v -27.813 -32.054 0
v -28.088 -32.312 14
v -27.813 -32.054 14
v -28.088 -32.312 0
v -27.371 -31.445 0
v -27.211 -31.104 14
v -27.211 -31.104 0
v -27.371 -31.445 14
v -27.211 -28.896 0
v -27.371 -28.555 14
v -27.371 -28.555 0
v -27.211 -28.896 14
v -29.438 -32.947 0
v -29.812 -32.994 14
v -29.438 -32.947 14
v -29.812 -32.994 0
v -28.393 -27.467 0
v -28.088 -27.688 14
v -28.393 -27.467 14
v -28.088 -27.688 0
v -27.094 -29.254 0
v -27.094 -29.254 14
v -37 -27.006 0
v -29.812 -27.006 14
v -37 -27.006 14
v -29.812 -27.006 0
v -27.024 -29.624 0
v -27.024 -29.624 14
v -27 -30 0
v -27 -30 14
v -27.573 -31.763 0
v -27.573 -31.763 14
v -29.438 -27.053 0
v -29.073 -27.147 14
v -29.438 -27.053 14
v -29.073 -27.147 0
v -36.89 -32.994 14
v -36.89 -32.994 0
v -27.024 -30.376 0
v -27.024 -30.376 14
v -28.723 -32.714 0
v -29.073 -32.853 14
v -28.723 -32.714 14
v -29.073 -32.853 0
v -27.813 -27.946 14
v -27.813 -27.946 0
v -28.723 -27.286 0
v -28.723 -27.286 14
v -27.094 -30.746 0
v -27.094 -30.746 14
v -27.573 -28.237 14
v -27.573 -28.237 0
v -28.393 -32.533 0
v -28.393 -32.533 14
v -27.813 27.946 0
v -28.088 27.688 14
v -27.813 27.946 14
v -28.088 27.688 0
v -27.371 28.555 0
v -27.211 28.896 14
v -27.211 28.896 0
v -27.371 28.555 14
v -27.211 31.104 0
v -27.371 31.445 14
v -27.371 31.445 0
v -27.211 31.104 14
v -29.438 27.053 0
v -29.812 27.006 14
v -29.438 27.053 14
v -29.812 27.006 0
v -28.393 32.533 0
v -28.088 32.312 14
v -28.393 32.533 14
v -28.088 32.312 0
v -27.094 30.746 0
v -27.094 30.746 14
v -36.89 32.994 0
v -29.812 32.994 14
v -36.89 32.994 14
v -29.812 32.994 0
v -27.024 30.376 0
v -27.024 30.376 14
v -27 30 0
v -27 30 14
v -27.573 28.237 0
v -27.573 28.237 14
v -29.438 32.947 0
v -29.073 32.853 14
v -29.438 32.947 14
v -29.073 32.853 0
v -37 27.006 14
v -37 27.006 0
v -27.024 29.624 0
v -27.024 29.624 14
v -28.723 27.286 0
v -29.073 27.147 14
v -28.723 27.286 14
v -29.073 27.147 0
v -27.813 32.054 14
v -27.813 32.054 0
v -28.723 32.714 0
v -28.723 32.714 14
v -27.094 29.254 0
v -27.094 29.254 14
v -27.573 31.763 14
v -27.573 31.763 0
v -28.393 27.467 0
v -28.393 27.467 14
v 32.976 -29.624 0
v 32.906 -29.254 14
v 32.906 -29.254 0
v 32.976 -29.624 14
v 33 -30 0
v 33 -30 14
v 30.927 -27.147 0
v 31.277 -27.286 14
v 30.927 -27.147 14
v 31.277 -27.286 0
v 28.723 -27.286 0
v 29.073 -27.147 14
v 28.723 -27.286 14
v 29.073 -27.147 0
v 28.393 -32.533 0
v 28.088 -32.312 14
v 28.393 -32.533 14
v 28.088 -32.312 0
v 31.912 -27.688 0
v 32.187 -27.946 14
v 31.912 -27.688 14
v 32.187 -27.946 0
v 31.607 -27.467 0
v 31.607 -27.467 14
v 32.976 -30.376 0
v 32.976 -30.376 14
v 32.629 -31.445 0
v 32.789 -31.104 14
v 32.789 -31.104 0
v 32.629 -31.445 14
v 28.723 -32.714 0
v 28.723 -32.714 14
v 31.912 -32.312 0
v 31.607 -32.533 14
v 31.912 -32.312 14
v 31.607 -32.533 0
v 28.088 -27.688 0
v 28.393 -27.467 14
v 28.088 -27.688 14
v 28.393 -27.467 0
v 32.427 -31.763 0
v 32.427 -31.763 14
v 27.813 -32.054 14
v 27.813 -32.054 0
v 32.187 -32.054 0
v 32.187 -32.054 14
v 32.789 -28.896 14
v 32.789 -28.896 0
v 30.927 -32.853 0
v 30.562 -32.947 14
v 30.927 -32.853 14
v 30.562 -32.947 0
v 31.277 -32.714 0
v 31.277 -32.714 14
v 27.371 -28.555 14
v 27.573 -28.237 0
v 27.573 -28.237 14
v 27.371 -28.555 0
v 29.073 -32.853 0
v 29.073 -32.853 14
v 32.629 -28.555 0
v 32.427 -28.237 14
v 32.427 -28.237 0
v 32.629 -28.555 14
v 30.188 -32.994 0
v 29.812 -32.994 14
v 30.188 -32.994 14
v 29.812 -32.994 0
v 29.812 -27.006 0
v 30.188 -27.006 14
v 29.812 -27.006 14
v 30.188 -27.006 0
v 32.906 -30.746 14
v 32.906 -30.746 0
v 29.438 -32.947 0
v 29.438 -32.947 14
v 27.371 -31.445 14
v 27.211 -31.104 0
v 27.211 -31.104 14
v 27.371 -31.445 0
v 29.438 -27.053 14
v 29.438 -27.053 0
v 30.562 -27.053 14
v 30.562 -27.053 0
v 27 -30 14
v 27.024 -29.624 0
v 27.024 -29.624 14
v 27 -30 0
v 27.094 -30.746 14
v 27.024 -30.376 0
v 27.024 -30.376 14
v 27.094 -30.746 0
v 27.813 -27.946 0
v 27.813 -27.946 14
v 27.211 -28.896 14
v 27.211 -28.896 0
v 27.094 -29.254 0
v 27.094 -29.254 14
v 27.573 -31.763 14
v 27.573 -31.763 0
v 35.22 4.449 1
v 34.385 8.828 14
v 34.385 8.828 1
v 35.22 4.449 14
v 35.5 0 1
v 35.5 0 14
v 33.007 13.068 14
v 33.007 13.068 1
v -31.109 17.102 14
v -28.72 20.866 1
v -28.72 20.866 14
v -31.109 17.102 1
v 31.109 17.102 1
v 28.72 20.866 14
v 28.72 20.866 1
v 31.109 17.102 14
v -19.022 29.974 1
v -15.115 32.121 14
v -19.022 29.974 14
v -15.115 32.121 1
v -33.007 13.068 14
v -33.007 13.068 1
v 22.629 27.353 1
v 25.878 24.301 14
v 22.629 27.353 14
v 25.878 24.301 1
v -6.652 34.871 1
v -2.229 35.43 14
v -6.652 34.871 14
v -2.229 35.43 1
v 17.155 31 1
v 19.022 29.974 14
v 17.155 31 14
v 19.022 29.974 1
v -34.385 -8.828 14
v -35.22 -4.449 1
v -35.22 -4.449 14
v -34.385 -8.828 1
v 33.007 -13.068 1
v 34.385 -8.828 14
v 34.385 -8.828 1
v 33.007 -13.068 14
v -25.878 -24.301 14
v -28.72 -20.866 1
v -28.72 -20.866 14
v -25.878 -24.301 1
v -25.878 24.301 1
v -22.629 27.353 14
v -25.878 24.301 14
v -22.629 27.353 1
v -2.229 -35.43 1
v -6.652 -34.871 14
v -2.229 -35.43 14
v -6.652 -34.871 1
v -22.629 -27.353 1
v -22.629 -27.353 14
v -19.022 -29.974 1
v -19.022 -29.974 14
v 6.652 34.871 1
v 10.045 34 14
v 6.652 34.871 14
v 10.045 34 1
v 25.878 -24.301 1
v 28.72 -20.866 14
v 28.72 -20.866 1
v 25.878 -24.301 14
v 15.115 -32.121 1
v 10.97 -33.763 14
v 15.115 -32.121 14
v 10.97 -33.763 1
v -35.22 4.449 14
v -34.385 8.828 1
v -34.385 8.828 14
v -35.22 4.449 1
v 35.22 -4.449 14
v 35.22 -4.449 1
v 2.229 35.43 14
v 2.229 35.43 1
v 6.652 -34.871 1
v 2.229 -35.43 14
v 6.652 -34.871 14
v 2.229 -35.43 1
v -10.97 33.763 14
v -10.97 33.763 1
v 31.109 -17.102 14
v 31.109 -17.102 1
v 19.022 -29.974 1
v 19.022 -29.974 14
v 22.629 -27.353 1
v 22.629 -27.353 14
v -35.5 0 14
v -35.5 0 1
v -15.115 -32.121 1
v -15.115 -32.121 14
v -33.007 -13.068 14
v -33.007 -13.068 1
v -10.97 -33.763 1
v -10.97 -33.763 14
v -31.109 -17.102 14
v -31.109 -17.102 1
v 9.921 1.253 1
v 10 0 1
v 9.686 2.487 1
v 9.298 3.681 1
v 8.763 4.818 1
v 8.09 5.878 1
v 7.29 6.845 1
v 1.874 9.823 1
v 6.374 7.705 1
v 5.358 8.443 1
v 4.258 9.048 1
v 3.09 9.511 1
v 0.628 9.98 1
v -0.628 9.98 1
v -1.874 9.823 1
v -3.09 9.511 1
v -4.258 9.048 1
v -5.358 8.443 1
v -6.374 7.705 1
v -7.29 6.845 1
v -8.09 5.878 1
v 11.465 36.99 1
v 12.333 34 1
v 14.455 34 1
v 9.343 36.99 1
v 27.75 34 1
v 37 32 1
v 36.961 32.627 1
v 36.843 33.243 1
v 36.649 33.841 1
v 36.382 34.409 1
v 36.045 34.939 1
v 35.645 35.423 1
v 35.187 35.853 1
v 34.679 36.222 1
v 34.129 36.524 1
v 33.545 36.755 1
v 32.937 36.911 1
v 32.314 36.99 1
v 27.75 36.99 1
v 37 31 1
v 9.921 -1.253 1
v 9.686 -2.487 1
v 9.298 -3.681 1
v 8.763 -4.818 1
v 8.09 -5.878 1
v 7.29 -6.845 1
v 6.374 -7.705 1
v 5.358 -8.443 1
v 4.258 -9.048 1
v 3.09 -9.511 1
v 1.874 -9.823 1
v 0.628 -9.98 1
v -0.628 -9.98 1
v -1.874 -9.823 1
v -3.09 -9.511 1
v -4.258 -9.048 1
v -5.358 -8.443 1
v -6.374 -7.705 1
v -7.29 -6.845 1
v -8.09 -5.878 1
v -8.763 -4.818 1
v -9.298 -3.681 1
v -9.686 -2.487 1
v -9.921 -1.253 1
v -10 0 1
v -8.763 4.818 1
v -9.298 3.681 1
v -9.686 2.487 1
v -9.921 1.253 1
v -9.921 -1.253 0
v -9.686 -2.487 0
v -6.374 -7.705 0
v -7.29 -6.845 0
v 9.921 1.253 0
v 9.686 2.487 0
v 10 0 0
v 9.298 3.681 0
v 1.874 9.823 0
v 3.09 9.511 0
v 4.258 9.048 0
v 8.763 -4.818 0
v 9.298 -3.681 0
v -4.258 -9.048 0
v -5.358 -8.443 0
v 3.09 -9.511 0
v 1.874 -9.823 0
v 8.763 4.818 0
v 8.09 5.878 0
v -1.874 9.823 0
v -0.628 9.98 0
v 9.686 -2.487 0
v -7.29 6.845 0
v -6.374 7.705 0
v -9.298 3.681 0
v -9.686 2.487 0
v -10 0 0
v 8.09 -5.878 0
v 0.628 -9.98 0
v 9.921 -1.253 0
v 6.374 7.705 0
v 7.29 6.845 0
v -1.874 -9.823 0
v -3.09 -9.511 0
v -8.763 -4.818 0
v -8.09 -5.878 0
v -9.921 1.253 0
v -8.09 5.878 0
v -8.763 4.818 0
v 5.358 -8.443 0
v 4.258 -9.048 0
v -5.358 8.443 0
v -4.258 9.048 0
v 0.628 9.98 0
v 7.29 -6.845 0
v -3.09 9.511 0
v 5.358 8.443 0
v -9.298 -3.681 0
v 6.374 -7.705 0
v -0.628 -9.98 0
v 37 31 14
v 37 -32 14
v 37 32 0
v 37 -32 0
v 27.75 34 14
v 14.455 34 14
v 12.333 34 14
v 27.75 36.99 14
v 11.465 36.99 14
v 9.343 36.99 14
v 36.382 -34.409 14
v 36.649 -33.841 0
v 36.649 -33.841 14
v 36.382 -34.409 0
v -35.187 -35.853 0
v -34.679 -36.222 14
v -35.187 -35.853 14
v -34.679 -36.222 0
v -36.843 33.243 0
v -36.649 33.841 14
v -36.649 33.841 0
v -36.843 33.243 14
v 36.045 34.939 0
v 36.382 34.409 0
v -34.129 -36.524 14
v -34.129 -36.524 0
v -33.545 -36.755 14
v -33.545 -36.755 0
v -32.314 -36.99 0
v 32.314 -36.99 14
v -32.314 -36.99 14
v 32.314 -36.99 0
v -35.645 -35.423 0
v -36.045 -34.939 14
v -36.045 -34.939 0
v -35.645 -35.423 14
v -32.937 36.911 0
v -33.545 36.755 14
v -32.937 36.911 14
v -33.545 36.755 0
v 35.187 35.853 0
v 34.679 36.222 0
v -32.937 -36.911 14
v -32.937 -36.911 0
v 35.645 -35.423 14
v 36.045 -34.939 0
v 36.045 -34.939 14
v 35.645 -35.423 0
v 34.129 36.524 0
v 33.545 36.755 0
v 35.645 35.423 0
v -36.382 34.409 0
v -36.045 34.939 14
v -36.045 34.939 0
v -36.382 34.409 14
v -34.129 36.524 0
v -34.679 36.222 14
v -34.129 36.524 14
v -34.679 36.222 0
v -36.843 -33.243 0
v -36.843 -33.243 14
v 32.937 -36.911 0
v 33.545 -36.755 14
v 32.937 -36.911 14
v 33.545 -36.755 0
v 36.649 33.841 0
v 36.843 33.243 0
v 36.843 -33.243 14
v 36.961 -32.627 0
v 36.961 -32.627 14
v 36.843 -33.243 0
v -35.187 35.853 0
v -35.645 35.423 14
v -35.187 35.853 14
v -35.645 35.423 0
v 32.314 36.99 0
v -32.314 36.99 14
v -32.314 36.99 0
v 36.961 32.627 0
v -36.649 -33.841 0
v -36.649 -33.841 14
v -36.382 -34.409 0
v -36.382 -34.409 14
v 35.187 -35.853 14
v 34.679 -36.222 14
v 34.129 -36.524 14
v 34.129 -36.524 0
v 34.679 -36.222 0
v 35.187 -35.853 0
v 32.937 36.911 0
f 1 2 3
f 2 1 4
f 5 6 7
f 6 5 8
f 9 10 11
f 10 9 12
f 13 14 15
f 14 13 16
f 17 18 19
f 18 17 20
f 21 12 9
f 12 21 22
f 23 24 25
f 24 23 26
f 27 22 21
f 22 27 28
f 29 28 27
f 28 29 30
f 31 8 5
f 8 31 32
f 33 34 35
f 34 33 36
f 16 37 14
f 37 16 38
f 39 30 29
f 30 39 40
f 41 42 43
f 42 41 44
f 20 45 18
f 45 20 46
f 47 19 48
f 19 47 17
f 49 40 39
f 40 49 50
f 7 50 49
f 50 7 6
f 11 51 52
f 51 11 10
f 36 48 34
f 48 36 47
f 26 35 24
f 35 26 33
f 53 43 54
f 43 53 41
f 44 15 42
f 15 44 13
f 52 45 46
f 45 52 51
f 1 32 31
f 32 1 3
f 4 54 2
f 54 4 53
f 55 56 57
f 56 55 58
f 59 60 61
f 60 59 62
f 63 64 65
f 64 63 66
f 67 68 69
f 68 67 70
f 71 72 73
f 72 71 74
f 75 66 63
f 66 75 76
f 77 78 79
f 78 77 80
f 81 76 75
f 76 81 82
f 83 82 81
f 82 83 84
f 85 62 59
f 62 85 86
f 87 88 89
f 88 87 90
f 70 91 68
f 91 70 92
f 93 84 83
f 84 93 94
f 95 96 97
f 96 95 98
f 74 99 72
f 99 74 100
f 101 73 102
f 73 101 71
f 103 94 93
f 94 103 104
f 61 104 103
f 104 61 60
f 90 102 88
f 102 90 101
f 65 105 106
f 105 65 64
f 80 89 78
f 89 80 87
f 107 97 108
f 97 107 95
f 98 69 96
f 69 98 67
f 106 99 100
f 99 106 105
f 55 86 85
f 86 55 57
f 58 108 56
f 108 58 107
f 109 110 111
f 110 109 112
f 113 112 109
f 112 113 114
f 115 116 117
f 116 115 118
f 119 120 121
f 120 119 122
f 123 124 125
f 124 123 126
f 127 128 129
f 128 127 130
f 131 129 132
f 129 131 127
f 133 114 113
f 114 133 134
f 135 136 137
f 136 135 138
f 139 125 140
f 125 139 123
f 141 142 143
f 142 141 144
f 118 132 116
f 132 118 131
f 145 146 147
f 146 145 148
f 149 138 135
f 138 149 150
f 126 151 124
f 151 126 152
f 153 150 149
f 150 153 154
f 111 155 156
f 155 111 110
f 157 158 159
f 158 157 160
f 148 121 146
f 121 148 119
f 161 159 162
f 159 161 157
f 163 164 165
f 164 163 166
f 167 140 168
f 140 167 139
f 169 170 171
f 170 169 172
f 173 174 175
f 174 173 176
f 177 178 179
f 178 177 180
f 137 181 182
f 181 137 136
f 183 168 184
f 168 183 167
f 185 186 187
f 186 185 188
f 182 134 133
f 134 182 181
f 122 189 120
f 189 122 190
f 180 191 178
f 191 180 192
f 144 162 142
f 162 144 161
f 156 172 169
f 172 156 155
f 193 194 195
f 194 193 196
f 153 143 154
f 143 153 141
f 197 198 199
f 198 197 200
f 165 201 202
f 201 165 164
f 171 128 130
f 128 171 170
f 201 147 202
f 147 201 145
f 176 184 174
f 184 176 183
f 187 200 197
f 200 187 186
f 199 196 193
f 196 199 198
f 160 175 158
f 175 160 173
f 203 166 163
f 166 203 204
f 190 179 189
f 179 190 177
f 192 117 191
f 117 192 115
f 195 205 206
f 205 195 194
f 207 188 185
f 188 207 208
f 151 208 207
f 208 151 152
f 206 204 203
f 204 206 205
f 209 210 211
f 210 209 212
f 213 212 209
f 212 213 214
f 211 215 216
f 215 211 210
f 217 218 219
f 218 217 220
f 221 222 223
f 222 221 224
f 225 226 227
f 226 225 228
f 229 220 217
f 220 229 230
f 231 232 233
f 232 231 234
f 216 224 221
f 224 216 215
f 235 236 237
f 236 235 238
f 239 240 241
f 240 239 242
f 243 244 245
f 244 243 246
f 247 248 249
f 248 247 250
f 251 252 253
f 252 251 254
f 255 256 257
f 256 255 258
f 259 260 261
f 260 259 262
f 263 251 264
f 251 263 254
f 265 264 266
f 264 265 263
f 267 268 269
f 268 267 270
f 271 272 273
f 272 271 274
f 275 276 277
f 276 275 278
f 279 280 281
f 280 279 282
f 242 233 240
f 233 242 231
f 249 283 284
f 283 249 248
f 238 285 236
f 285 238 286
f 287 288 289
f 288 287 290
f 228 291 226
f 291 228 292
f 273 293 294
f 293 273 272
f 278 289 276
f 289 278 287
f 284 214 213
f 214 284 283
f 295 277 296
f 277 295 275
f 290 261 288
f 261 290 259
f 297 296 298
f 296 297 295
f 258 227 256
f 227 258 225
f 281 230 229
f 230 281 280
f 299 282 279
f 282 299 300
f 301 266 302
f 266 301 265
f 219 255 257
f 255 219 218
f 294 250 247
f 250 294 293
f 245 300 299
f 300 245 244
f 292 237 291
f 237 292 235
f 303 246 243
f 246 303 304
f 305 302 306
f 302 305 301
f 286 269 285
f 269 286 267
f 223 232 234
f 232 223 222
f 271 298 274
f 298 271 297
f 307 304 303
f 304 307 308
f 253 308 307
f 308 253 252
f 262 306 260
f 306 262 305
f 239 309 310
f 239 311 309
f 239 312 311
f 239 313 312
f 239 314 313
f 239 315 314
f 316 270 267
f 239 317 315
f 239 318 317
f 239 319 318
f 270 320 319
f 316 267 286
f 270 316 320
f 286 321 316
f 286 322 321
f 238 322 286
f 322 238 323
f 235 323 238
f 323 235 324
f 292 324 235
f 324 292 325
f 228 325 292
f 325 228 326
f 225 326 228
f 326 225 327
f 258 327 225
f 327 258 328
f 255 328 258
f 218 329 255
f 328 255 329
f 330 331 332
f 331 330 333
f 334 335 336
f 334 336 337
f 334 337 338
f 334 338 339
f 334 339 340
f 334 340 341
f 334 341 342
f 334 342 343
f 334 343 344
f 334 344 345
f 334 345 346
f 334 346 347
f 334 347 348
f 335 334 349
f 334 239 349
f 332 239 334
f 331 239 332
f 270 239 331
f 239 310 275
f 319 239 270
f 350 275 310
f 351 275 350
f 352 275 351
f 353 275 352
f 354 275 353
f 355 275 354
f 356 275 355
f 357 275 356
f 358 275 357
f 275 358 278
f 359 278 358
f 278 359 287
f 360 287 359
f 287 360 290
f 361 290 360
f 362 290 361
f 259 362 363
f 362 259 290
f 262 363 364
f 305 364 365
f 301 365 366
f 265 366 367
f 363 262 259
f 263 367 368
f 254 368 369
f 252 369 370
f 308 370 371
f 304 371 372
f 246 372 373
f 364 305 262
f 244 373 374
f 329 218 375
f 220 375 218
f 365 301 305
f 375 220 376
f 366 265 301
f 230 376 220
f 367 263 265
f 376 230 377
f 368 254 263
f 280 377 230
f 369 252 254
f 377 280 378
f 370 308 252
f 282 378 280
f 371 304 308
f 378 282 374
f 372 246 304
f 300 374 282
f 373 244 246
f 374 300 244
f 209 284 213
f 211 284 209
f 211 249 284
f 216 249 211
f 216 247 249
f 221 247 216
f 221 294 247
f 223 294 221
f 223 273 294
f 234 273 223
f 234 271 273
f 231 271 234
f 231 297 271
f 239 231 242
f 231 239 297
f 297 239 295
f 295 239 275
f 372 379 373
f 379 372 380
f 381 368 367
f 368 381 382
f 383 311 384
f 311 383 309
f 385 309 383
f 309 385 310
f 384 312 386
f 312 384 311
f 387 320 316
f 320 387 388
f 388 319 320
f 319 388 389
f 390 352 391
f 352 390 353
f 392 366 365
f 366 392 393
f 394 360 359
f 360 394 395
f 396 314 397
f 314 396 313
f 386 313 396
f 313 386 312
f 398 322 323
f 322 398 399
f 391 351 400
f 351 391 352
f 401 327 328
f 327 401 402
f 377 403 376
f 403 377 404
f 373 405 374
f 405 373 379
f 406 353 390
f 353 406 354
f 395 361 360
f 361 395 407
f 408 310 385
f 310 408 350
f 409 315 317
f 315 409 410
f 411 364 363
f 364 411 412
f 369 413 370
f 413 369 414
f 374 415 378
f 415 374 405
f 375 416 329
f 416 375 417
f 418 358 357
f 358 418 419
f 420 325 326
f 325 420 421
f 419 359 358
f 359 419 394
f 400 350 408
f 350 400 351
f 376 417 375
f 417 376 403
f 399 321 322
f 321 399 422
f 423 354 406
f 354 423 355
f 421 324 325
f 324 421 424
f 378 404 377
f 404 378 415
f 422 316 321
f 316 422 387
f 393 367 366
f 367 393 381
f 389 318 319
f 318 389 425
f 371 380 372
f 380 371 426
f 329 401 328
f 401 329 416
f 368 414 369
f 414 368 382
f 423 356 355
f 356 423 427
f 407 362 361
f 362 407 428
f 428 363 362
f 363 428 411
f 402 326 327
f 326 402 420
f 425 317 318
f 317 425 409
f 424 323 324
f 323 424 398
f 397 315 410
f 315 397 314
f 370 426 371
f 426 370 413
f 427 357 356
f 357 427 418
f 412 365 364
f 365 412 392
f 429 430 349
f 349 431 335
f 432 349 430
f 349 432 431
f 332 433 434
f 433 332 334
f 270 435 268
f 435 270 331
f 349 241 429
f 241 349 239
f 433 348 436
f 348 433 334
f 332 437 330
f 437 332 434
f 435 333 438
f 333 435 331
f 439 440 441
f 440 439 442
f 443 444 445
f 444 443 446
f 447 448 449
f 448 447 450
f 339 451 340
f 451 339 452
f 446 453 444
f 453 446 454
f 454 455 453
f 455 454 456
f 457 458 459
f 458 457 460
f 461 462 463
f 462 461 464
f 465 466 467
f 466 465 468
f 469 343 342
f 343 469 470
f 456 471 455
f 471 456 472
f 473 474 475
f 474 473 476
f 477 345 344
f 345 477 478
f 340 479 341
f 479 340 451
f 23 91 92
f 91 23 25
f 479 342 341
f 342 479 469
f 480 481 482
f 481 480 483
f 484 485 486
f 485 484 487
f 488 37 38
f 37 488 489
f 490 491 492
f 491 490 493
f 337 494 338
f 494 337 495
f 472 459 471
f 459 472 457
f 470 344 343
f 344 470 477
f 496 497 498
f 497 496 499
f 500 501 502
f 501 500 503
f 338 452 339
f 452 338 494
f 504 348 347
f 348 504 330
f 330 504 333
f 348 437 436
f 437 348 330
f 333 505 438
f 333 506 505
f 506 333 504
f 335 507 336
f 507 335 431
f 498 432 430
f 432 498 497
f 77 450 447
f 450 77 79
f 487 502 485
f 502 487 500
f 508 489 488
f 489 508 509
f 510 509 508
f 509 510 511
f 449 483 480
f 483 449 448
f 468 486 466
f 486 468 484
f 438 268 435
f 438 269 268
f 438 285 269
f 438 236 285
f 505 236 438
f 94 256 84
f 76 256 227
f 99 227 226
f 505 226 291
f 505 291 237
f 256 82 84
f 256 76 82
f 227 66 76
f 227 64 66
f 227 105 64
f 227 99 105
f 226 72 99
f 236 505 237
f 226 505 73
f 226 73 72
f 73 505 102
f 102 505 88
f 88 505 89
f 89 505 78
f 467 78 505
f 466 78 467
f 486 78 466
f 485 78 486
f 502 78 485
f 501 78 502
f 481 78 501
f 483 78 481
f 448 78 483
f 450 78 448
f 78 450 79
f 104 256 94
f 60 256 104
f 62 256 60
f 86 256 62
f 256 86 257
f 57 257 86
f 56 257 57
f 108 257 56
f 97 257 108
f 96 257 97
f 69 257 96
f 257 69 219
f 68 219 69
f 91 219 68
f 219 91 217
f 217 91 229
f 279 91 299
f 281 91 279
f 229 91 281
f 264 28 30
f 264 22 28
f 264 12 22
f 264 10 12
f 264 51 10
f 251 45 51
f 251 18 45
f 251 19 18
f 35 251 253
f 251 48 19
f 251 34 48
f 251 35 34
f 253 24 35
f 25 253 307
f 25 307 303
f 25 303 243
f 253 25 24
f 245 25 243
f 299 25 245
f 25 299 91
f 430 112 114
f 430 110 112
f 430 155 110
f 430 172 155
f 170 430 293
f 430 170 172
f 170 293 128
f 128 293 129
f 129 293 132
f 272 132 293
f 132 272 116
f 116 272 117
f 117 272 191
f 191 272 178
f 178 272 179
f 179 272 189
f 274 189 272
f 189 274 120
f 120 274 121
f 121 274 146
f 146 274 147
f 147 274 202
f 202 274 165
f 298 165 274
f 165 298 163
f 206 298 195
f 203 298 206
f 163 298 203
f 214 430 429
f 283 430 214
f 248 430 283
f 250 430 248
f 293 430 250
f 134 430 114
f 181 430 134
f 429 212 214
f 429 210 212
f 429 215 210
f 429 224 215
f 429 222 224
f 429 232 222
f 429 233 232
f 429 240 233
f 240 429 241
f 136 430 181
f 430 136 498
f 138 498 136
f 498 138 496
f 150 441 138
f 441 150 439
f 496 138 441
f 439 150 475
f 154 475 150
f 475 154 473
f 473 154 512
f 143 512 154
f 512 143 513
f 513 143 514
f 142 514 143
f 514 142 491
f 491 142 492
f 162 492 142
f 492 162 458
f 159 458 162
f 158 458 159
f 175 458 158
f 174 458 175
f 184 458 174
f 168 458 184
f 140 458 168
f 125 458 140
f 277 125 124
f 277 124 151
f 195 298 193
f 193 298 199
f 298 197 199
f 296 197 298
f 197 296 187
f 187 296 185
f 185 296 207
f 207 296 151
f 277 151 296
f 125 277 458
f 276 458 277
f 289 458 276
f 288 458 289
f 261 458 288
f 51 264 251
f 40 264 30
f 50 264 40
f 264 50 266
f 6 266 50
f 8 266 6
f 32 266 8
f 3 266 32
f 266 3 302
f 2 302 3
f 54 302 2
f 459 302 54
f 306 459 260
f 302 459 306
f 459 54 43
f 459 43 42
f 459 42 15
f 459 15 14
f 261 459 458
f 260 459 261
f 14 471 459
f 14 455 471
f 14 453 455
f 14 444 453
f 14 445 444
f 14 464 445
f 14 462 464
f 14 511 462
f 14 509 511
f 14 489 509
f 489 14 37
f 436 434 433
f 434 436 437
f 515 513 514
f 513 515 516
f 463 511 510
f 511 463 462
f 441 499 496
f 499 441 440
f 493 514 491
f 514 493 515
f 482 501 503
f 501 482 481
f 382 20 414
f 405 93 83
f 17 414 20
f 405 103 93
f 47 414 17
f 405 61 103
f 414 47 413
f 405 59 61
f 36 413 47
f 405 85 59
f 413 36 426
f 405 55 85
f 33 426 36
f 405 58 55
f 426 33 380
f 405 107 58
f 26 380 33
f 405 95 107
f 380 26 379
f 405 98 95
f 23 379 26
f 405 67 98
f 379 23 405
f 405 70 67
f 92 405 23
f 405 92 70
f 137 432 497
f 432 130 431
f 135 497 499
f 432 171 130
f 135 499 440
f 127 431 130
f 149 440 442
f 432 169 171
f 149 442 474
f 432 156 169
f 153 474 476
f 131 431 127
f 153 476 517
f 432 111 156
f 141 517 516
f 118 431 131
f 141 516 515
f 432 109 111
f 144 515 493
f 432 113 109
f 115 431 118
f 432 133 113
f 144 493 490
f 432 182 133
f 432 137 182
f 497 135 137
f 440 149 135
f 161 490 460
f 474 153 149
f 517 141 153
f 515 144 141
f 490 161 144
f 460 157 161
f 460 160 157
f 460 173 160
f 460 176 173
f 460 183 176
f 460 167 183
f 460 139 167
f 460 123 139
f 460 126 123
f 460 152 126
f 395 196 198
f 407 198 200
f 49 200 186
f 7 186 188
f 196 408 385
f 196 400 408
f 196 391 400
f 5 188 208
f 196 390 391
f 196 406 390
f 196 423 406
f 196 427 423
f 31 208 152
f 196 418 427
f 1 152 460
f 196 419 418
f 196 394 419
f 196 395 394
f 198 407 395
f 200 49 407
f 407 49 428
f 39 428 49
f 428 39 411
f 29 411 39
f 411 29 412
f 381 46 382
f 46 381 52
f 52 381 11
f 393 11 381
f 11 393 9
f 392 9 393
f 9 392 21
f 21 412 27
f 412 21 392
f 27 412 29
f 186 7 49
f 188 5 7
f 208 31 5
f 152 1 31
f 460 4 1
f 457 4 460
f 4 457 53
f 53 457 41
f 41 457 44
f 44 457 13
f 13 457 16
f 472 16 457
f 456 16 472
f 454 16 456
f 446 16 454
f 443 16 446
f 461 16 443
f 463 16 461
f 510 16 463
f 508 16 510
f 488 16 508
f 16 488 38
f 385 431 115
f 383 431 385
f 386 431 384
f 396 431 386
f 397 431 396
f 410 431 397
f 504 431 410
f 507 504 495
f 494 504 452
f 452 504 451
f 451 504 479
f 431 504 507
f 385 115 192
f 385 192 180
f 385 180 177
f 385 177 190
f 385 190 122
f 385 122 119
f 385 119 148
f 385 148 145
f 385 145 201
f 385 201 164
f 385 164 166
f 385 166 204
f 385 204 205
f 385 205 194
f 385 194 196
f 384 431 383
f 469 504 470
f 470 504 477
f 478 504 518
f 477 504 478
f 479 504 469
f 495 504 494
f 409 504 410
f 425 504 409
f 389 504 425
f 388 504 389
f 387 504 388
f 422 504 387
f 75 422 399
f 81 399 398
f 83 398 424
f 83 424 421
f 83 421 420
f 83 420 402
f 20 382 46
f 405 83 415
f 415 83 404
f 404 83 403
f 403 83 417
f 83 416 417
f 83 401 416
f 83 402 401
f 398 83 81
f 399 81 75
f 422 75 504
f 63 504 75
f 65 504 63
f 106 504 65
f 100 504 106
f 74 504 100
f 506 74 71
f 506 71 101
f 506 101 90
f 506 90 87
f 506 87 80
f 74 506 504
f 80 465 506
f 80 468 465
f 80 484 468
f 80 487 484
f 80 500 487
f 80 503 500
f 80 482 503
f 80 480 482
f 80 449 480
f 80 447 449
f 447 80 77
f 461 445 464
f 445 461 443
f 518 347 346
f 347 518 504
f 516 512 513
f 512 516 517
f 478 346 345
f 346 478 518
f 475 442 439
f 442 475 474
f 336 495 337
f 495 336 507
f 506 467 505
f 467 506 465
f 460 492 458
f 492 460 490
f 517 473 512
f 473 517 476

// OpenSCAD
$fn = 50;


difference() {
	union() {
		translate(v = [0, 0, 0]) {
			rotate(a = [0, 0, 0]) {
				hull() {
					translate(v = [-32.0000000000, 32.0000000000, 0]) {
						rotate(a = [0, 0, 0]) {
							translate(v = [0, 0, 0]) {
								rotate(a = [0, 0, 0]) {
									cylinder(h = 14, r = 5);
								}
							}
						}
					}
					translate(v = [32.0000000000, 32.0000000000, 0]) {
						rotate(a = [0, 0, 0]) {
							translate(v = [0, 0, 0]) {
								rotate(a = [0, 0, 0]) {
									cylinder(h = 14, r = 5);
								}
							}
						}
					}
					translate(v = [-32.0000000000, -32.0000000000, 0]) {
						rotate(a = [0, 0, 0]) {
							translate(v = [0, 0, 0]) {
								rotate(a = [0, 0, 0]) {
									cylinder(h = 14, r = 5);
								}
							}
						}
					}
					translate(v = [32.0000000000, -32.0000000000, 0]) {
						rotate(a = [0, 0, 0]) {
							translate(v = [0, 0, 0]) {
								rotate(a = [0, 0, 0]) {
									cylinder(h = 14, r = 5);
								}
							}
						}
					}
				}
			}
		}
	}
	union() {
		translate(v = [-37.5000000000, -30.0000000000, -125]) {
			rotate(a = [0, 0, 0]) {
				hull() {
					translate(v = [7.5000000000, 0, 0]) {
						rotate(a = [0, 0, 0]) {
							translate(v = [0, 0, 0]) {
								rotate(a = [0, 0, 0]) {
									cylinder(h = 250, r = 3.0000000000);
								}
							}
						}
					}
					translate(v = [-7.5000000000, 0, 0]) {
						rotate(a = [0, 0, 0]) {
							translate(v = [0, 0, 0]) {
								rotate(a = [0, 0, 0]) {
									cylinder(h = 250, r = 3.0000000000);
								}
							}
						}
					}
				}
			}
		}
		translate(v = [-37.5000000000, 30.0000000000, -125]) {
			rotate(a = [0, 0, 0]) {
				hull() {
					translate(v = [7.5000000000, 0, 0]) {
						rotate(a = [0, 0, 0]) {
							translate(v = [0, 0, 0]) {
								rotate(a = [0, 0, 0]) {
									cylinder(h = 250, r = 3.0000000000);
								}
							}
						}
					}
					translate(v = [-7.5000000000, 0, 0]) {
						rotate(a = [0, 0, 0]) {
							translate(v = [0, 0, 0]) {
								rotate(a = [0, 0, 0]) {
									cylinder(h = 250, r = 3.0000000000);
								}
							}
						}
					}
				}
			}
		}
		translate(v = [30.0000000000, -30.0000000000, -125.0000000000]) {
			rotate(a = [0, 0, 0]) {
				cylinder(h = 250, r = 3.0000000000);
			}
		}
		translate(v = [0, 0, 1.0000000000]) {
			rotate(a = [0, 0, 0]) {
				cylinder(h = 16, r = 35.5000000000);
			}
		}
		translate(v = [0, 0, -7.0000000000]) {
			rotate(a = [0, 0, 0]) {
				cylinder(h = 14, r = 10.0000000000);
			}
		}
		translate(v = [0.0000000000, 31.0000000000, 1]) {
			rotate(a = [0, 0, 0]) {
				cube(size = [37.0000000000, 3, 16]);
			}
		}
		translate(v = [27.7500000000, 31.0000000000, 1]) {
			rotate(a = [0, 0, 0]) {
				cube(size = [9.2500000000, 6, 16]);
			}
		}
		translate(v = [8.5833333333, 37.7500000000, 1]) {
			rotate(a = [0, 0, -45]) {
				cube(size = [7.5000000000, 1.5000000000, 16]);
			}
		}
	}
}
